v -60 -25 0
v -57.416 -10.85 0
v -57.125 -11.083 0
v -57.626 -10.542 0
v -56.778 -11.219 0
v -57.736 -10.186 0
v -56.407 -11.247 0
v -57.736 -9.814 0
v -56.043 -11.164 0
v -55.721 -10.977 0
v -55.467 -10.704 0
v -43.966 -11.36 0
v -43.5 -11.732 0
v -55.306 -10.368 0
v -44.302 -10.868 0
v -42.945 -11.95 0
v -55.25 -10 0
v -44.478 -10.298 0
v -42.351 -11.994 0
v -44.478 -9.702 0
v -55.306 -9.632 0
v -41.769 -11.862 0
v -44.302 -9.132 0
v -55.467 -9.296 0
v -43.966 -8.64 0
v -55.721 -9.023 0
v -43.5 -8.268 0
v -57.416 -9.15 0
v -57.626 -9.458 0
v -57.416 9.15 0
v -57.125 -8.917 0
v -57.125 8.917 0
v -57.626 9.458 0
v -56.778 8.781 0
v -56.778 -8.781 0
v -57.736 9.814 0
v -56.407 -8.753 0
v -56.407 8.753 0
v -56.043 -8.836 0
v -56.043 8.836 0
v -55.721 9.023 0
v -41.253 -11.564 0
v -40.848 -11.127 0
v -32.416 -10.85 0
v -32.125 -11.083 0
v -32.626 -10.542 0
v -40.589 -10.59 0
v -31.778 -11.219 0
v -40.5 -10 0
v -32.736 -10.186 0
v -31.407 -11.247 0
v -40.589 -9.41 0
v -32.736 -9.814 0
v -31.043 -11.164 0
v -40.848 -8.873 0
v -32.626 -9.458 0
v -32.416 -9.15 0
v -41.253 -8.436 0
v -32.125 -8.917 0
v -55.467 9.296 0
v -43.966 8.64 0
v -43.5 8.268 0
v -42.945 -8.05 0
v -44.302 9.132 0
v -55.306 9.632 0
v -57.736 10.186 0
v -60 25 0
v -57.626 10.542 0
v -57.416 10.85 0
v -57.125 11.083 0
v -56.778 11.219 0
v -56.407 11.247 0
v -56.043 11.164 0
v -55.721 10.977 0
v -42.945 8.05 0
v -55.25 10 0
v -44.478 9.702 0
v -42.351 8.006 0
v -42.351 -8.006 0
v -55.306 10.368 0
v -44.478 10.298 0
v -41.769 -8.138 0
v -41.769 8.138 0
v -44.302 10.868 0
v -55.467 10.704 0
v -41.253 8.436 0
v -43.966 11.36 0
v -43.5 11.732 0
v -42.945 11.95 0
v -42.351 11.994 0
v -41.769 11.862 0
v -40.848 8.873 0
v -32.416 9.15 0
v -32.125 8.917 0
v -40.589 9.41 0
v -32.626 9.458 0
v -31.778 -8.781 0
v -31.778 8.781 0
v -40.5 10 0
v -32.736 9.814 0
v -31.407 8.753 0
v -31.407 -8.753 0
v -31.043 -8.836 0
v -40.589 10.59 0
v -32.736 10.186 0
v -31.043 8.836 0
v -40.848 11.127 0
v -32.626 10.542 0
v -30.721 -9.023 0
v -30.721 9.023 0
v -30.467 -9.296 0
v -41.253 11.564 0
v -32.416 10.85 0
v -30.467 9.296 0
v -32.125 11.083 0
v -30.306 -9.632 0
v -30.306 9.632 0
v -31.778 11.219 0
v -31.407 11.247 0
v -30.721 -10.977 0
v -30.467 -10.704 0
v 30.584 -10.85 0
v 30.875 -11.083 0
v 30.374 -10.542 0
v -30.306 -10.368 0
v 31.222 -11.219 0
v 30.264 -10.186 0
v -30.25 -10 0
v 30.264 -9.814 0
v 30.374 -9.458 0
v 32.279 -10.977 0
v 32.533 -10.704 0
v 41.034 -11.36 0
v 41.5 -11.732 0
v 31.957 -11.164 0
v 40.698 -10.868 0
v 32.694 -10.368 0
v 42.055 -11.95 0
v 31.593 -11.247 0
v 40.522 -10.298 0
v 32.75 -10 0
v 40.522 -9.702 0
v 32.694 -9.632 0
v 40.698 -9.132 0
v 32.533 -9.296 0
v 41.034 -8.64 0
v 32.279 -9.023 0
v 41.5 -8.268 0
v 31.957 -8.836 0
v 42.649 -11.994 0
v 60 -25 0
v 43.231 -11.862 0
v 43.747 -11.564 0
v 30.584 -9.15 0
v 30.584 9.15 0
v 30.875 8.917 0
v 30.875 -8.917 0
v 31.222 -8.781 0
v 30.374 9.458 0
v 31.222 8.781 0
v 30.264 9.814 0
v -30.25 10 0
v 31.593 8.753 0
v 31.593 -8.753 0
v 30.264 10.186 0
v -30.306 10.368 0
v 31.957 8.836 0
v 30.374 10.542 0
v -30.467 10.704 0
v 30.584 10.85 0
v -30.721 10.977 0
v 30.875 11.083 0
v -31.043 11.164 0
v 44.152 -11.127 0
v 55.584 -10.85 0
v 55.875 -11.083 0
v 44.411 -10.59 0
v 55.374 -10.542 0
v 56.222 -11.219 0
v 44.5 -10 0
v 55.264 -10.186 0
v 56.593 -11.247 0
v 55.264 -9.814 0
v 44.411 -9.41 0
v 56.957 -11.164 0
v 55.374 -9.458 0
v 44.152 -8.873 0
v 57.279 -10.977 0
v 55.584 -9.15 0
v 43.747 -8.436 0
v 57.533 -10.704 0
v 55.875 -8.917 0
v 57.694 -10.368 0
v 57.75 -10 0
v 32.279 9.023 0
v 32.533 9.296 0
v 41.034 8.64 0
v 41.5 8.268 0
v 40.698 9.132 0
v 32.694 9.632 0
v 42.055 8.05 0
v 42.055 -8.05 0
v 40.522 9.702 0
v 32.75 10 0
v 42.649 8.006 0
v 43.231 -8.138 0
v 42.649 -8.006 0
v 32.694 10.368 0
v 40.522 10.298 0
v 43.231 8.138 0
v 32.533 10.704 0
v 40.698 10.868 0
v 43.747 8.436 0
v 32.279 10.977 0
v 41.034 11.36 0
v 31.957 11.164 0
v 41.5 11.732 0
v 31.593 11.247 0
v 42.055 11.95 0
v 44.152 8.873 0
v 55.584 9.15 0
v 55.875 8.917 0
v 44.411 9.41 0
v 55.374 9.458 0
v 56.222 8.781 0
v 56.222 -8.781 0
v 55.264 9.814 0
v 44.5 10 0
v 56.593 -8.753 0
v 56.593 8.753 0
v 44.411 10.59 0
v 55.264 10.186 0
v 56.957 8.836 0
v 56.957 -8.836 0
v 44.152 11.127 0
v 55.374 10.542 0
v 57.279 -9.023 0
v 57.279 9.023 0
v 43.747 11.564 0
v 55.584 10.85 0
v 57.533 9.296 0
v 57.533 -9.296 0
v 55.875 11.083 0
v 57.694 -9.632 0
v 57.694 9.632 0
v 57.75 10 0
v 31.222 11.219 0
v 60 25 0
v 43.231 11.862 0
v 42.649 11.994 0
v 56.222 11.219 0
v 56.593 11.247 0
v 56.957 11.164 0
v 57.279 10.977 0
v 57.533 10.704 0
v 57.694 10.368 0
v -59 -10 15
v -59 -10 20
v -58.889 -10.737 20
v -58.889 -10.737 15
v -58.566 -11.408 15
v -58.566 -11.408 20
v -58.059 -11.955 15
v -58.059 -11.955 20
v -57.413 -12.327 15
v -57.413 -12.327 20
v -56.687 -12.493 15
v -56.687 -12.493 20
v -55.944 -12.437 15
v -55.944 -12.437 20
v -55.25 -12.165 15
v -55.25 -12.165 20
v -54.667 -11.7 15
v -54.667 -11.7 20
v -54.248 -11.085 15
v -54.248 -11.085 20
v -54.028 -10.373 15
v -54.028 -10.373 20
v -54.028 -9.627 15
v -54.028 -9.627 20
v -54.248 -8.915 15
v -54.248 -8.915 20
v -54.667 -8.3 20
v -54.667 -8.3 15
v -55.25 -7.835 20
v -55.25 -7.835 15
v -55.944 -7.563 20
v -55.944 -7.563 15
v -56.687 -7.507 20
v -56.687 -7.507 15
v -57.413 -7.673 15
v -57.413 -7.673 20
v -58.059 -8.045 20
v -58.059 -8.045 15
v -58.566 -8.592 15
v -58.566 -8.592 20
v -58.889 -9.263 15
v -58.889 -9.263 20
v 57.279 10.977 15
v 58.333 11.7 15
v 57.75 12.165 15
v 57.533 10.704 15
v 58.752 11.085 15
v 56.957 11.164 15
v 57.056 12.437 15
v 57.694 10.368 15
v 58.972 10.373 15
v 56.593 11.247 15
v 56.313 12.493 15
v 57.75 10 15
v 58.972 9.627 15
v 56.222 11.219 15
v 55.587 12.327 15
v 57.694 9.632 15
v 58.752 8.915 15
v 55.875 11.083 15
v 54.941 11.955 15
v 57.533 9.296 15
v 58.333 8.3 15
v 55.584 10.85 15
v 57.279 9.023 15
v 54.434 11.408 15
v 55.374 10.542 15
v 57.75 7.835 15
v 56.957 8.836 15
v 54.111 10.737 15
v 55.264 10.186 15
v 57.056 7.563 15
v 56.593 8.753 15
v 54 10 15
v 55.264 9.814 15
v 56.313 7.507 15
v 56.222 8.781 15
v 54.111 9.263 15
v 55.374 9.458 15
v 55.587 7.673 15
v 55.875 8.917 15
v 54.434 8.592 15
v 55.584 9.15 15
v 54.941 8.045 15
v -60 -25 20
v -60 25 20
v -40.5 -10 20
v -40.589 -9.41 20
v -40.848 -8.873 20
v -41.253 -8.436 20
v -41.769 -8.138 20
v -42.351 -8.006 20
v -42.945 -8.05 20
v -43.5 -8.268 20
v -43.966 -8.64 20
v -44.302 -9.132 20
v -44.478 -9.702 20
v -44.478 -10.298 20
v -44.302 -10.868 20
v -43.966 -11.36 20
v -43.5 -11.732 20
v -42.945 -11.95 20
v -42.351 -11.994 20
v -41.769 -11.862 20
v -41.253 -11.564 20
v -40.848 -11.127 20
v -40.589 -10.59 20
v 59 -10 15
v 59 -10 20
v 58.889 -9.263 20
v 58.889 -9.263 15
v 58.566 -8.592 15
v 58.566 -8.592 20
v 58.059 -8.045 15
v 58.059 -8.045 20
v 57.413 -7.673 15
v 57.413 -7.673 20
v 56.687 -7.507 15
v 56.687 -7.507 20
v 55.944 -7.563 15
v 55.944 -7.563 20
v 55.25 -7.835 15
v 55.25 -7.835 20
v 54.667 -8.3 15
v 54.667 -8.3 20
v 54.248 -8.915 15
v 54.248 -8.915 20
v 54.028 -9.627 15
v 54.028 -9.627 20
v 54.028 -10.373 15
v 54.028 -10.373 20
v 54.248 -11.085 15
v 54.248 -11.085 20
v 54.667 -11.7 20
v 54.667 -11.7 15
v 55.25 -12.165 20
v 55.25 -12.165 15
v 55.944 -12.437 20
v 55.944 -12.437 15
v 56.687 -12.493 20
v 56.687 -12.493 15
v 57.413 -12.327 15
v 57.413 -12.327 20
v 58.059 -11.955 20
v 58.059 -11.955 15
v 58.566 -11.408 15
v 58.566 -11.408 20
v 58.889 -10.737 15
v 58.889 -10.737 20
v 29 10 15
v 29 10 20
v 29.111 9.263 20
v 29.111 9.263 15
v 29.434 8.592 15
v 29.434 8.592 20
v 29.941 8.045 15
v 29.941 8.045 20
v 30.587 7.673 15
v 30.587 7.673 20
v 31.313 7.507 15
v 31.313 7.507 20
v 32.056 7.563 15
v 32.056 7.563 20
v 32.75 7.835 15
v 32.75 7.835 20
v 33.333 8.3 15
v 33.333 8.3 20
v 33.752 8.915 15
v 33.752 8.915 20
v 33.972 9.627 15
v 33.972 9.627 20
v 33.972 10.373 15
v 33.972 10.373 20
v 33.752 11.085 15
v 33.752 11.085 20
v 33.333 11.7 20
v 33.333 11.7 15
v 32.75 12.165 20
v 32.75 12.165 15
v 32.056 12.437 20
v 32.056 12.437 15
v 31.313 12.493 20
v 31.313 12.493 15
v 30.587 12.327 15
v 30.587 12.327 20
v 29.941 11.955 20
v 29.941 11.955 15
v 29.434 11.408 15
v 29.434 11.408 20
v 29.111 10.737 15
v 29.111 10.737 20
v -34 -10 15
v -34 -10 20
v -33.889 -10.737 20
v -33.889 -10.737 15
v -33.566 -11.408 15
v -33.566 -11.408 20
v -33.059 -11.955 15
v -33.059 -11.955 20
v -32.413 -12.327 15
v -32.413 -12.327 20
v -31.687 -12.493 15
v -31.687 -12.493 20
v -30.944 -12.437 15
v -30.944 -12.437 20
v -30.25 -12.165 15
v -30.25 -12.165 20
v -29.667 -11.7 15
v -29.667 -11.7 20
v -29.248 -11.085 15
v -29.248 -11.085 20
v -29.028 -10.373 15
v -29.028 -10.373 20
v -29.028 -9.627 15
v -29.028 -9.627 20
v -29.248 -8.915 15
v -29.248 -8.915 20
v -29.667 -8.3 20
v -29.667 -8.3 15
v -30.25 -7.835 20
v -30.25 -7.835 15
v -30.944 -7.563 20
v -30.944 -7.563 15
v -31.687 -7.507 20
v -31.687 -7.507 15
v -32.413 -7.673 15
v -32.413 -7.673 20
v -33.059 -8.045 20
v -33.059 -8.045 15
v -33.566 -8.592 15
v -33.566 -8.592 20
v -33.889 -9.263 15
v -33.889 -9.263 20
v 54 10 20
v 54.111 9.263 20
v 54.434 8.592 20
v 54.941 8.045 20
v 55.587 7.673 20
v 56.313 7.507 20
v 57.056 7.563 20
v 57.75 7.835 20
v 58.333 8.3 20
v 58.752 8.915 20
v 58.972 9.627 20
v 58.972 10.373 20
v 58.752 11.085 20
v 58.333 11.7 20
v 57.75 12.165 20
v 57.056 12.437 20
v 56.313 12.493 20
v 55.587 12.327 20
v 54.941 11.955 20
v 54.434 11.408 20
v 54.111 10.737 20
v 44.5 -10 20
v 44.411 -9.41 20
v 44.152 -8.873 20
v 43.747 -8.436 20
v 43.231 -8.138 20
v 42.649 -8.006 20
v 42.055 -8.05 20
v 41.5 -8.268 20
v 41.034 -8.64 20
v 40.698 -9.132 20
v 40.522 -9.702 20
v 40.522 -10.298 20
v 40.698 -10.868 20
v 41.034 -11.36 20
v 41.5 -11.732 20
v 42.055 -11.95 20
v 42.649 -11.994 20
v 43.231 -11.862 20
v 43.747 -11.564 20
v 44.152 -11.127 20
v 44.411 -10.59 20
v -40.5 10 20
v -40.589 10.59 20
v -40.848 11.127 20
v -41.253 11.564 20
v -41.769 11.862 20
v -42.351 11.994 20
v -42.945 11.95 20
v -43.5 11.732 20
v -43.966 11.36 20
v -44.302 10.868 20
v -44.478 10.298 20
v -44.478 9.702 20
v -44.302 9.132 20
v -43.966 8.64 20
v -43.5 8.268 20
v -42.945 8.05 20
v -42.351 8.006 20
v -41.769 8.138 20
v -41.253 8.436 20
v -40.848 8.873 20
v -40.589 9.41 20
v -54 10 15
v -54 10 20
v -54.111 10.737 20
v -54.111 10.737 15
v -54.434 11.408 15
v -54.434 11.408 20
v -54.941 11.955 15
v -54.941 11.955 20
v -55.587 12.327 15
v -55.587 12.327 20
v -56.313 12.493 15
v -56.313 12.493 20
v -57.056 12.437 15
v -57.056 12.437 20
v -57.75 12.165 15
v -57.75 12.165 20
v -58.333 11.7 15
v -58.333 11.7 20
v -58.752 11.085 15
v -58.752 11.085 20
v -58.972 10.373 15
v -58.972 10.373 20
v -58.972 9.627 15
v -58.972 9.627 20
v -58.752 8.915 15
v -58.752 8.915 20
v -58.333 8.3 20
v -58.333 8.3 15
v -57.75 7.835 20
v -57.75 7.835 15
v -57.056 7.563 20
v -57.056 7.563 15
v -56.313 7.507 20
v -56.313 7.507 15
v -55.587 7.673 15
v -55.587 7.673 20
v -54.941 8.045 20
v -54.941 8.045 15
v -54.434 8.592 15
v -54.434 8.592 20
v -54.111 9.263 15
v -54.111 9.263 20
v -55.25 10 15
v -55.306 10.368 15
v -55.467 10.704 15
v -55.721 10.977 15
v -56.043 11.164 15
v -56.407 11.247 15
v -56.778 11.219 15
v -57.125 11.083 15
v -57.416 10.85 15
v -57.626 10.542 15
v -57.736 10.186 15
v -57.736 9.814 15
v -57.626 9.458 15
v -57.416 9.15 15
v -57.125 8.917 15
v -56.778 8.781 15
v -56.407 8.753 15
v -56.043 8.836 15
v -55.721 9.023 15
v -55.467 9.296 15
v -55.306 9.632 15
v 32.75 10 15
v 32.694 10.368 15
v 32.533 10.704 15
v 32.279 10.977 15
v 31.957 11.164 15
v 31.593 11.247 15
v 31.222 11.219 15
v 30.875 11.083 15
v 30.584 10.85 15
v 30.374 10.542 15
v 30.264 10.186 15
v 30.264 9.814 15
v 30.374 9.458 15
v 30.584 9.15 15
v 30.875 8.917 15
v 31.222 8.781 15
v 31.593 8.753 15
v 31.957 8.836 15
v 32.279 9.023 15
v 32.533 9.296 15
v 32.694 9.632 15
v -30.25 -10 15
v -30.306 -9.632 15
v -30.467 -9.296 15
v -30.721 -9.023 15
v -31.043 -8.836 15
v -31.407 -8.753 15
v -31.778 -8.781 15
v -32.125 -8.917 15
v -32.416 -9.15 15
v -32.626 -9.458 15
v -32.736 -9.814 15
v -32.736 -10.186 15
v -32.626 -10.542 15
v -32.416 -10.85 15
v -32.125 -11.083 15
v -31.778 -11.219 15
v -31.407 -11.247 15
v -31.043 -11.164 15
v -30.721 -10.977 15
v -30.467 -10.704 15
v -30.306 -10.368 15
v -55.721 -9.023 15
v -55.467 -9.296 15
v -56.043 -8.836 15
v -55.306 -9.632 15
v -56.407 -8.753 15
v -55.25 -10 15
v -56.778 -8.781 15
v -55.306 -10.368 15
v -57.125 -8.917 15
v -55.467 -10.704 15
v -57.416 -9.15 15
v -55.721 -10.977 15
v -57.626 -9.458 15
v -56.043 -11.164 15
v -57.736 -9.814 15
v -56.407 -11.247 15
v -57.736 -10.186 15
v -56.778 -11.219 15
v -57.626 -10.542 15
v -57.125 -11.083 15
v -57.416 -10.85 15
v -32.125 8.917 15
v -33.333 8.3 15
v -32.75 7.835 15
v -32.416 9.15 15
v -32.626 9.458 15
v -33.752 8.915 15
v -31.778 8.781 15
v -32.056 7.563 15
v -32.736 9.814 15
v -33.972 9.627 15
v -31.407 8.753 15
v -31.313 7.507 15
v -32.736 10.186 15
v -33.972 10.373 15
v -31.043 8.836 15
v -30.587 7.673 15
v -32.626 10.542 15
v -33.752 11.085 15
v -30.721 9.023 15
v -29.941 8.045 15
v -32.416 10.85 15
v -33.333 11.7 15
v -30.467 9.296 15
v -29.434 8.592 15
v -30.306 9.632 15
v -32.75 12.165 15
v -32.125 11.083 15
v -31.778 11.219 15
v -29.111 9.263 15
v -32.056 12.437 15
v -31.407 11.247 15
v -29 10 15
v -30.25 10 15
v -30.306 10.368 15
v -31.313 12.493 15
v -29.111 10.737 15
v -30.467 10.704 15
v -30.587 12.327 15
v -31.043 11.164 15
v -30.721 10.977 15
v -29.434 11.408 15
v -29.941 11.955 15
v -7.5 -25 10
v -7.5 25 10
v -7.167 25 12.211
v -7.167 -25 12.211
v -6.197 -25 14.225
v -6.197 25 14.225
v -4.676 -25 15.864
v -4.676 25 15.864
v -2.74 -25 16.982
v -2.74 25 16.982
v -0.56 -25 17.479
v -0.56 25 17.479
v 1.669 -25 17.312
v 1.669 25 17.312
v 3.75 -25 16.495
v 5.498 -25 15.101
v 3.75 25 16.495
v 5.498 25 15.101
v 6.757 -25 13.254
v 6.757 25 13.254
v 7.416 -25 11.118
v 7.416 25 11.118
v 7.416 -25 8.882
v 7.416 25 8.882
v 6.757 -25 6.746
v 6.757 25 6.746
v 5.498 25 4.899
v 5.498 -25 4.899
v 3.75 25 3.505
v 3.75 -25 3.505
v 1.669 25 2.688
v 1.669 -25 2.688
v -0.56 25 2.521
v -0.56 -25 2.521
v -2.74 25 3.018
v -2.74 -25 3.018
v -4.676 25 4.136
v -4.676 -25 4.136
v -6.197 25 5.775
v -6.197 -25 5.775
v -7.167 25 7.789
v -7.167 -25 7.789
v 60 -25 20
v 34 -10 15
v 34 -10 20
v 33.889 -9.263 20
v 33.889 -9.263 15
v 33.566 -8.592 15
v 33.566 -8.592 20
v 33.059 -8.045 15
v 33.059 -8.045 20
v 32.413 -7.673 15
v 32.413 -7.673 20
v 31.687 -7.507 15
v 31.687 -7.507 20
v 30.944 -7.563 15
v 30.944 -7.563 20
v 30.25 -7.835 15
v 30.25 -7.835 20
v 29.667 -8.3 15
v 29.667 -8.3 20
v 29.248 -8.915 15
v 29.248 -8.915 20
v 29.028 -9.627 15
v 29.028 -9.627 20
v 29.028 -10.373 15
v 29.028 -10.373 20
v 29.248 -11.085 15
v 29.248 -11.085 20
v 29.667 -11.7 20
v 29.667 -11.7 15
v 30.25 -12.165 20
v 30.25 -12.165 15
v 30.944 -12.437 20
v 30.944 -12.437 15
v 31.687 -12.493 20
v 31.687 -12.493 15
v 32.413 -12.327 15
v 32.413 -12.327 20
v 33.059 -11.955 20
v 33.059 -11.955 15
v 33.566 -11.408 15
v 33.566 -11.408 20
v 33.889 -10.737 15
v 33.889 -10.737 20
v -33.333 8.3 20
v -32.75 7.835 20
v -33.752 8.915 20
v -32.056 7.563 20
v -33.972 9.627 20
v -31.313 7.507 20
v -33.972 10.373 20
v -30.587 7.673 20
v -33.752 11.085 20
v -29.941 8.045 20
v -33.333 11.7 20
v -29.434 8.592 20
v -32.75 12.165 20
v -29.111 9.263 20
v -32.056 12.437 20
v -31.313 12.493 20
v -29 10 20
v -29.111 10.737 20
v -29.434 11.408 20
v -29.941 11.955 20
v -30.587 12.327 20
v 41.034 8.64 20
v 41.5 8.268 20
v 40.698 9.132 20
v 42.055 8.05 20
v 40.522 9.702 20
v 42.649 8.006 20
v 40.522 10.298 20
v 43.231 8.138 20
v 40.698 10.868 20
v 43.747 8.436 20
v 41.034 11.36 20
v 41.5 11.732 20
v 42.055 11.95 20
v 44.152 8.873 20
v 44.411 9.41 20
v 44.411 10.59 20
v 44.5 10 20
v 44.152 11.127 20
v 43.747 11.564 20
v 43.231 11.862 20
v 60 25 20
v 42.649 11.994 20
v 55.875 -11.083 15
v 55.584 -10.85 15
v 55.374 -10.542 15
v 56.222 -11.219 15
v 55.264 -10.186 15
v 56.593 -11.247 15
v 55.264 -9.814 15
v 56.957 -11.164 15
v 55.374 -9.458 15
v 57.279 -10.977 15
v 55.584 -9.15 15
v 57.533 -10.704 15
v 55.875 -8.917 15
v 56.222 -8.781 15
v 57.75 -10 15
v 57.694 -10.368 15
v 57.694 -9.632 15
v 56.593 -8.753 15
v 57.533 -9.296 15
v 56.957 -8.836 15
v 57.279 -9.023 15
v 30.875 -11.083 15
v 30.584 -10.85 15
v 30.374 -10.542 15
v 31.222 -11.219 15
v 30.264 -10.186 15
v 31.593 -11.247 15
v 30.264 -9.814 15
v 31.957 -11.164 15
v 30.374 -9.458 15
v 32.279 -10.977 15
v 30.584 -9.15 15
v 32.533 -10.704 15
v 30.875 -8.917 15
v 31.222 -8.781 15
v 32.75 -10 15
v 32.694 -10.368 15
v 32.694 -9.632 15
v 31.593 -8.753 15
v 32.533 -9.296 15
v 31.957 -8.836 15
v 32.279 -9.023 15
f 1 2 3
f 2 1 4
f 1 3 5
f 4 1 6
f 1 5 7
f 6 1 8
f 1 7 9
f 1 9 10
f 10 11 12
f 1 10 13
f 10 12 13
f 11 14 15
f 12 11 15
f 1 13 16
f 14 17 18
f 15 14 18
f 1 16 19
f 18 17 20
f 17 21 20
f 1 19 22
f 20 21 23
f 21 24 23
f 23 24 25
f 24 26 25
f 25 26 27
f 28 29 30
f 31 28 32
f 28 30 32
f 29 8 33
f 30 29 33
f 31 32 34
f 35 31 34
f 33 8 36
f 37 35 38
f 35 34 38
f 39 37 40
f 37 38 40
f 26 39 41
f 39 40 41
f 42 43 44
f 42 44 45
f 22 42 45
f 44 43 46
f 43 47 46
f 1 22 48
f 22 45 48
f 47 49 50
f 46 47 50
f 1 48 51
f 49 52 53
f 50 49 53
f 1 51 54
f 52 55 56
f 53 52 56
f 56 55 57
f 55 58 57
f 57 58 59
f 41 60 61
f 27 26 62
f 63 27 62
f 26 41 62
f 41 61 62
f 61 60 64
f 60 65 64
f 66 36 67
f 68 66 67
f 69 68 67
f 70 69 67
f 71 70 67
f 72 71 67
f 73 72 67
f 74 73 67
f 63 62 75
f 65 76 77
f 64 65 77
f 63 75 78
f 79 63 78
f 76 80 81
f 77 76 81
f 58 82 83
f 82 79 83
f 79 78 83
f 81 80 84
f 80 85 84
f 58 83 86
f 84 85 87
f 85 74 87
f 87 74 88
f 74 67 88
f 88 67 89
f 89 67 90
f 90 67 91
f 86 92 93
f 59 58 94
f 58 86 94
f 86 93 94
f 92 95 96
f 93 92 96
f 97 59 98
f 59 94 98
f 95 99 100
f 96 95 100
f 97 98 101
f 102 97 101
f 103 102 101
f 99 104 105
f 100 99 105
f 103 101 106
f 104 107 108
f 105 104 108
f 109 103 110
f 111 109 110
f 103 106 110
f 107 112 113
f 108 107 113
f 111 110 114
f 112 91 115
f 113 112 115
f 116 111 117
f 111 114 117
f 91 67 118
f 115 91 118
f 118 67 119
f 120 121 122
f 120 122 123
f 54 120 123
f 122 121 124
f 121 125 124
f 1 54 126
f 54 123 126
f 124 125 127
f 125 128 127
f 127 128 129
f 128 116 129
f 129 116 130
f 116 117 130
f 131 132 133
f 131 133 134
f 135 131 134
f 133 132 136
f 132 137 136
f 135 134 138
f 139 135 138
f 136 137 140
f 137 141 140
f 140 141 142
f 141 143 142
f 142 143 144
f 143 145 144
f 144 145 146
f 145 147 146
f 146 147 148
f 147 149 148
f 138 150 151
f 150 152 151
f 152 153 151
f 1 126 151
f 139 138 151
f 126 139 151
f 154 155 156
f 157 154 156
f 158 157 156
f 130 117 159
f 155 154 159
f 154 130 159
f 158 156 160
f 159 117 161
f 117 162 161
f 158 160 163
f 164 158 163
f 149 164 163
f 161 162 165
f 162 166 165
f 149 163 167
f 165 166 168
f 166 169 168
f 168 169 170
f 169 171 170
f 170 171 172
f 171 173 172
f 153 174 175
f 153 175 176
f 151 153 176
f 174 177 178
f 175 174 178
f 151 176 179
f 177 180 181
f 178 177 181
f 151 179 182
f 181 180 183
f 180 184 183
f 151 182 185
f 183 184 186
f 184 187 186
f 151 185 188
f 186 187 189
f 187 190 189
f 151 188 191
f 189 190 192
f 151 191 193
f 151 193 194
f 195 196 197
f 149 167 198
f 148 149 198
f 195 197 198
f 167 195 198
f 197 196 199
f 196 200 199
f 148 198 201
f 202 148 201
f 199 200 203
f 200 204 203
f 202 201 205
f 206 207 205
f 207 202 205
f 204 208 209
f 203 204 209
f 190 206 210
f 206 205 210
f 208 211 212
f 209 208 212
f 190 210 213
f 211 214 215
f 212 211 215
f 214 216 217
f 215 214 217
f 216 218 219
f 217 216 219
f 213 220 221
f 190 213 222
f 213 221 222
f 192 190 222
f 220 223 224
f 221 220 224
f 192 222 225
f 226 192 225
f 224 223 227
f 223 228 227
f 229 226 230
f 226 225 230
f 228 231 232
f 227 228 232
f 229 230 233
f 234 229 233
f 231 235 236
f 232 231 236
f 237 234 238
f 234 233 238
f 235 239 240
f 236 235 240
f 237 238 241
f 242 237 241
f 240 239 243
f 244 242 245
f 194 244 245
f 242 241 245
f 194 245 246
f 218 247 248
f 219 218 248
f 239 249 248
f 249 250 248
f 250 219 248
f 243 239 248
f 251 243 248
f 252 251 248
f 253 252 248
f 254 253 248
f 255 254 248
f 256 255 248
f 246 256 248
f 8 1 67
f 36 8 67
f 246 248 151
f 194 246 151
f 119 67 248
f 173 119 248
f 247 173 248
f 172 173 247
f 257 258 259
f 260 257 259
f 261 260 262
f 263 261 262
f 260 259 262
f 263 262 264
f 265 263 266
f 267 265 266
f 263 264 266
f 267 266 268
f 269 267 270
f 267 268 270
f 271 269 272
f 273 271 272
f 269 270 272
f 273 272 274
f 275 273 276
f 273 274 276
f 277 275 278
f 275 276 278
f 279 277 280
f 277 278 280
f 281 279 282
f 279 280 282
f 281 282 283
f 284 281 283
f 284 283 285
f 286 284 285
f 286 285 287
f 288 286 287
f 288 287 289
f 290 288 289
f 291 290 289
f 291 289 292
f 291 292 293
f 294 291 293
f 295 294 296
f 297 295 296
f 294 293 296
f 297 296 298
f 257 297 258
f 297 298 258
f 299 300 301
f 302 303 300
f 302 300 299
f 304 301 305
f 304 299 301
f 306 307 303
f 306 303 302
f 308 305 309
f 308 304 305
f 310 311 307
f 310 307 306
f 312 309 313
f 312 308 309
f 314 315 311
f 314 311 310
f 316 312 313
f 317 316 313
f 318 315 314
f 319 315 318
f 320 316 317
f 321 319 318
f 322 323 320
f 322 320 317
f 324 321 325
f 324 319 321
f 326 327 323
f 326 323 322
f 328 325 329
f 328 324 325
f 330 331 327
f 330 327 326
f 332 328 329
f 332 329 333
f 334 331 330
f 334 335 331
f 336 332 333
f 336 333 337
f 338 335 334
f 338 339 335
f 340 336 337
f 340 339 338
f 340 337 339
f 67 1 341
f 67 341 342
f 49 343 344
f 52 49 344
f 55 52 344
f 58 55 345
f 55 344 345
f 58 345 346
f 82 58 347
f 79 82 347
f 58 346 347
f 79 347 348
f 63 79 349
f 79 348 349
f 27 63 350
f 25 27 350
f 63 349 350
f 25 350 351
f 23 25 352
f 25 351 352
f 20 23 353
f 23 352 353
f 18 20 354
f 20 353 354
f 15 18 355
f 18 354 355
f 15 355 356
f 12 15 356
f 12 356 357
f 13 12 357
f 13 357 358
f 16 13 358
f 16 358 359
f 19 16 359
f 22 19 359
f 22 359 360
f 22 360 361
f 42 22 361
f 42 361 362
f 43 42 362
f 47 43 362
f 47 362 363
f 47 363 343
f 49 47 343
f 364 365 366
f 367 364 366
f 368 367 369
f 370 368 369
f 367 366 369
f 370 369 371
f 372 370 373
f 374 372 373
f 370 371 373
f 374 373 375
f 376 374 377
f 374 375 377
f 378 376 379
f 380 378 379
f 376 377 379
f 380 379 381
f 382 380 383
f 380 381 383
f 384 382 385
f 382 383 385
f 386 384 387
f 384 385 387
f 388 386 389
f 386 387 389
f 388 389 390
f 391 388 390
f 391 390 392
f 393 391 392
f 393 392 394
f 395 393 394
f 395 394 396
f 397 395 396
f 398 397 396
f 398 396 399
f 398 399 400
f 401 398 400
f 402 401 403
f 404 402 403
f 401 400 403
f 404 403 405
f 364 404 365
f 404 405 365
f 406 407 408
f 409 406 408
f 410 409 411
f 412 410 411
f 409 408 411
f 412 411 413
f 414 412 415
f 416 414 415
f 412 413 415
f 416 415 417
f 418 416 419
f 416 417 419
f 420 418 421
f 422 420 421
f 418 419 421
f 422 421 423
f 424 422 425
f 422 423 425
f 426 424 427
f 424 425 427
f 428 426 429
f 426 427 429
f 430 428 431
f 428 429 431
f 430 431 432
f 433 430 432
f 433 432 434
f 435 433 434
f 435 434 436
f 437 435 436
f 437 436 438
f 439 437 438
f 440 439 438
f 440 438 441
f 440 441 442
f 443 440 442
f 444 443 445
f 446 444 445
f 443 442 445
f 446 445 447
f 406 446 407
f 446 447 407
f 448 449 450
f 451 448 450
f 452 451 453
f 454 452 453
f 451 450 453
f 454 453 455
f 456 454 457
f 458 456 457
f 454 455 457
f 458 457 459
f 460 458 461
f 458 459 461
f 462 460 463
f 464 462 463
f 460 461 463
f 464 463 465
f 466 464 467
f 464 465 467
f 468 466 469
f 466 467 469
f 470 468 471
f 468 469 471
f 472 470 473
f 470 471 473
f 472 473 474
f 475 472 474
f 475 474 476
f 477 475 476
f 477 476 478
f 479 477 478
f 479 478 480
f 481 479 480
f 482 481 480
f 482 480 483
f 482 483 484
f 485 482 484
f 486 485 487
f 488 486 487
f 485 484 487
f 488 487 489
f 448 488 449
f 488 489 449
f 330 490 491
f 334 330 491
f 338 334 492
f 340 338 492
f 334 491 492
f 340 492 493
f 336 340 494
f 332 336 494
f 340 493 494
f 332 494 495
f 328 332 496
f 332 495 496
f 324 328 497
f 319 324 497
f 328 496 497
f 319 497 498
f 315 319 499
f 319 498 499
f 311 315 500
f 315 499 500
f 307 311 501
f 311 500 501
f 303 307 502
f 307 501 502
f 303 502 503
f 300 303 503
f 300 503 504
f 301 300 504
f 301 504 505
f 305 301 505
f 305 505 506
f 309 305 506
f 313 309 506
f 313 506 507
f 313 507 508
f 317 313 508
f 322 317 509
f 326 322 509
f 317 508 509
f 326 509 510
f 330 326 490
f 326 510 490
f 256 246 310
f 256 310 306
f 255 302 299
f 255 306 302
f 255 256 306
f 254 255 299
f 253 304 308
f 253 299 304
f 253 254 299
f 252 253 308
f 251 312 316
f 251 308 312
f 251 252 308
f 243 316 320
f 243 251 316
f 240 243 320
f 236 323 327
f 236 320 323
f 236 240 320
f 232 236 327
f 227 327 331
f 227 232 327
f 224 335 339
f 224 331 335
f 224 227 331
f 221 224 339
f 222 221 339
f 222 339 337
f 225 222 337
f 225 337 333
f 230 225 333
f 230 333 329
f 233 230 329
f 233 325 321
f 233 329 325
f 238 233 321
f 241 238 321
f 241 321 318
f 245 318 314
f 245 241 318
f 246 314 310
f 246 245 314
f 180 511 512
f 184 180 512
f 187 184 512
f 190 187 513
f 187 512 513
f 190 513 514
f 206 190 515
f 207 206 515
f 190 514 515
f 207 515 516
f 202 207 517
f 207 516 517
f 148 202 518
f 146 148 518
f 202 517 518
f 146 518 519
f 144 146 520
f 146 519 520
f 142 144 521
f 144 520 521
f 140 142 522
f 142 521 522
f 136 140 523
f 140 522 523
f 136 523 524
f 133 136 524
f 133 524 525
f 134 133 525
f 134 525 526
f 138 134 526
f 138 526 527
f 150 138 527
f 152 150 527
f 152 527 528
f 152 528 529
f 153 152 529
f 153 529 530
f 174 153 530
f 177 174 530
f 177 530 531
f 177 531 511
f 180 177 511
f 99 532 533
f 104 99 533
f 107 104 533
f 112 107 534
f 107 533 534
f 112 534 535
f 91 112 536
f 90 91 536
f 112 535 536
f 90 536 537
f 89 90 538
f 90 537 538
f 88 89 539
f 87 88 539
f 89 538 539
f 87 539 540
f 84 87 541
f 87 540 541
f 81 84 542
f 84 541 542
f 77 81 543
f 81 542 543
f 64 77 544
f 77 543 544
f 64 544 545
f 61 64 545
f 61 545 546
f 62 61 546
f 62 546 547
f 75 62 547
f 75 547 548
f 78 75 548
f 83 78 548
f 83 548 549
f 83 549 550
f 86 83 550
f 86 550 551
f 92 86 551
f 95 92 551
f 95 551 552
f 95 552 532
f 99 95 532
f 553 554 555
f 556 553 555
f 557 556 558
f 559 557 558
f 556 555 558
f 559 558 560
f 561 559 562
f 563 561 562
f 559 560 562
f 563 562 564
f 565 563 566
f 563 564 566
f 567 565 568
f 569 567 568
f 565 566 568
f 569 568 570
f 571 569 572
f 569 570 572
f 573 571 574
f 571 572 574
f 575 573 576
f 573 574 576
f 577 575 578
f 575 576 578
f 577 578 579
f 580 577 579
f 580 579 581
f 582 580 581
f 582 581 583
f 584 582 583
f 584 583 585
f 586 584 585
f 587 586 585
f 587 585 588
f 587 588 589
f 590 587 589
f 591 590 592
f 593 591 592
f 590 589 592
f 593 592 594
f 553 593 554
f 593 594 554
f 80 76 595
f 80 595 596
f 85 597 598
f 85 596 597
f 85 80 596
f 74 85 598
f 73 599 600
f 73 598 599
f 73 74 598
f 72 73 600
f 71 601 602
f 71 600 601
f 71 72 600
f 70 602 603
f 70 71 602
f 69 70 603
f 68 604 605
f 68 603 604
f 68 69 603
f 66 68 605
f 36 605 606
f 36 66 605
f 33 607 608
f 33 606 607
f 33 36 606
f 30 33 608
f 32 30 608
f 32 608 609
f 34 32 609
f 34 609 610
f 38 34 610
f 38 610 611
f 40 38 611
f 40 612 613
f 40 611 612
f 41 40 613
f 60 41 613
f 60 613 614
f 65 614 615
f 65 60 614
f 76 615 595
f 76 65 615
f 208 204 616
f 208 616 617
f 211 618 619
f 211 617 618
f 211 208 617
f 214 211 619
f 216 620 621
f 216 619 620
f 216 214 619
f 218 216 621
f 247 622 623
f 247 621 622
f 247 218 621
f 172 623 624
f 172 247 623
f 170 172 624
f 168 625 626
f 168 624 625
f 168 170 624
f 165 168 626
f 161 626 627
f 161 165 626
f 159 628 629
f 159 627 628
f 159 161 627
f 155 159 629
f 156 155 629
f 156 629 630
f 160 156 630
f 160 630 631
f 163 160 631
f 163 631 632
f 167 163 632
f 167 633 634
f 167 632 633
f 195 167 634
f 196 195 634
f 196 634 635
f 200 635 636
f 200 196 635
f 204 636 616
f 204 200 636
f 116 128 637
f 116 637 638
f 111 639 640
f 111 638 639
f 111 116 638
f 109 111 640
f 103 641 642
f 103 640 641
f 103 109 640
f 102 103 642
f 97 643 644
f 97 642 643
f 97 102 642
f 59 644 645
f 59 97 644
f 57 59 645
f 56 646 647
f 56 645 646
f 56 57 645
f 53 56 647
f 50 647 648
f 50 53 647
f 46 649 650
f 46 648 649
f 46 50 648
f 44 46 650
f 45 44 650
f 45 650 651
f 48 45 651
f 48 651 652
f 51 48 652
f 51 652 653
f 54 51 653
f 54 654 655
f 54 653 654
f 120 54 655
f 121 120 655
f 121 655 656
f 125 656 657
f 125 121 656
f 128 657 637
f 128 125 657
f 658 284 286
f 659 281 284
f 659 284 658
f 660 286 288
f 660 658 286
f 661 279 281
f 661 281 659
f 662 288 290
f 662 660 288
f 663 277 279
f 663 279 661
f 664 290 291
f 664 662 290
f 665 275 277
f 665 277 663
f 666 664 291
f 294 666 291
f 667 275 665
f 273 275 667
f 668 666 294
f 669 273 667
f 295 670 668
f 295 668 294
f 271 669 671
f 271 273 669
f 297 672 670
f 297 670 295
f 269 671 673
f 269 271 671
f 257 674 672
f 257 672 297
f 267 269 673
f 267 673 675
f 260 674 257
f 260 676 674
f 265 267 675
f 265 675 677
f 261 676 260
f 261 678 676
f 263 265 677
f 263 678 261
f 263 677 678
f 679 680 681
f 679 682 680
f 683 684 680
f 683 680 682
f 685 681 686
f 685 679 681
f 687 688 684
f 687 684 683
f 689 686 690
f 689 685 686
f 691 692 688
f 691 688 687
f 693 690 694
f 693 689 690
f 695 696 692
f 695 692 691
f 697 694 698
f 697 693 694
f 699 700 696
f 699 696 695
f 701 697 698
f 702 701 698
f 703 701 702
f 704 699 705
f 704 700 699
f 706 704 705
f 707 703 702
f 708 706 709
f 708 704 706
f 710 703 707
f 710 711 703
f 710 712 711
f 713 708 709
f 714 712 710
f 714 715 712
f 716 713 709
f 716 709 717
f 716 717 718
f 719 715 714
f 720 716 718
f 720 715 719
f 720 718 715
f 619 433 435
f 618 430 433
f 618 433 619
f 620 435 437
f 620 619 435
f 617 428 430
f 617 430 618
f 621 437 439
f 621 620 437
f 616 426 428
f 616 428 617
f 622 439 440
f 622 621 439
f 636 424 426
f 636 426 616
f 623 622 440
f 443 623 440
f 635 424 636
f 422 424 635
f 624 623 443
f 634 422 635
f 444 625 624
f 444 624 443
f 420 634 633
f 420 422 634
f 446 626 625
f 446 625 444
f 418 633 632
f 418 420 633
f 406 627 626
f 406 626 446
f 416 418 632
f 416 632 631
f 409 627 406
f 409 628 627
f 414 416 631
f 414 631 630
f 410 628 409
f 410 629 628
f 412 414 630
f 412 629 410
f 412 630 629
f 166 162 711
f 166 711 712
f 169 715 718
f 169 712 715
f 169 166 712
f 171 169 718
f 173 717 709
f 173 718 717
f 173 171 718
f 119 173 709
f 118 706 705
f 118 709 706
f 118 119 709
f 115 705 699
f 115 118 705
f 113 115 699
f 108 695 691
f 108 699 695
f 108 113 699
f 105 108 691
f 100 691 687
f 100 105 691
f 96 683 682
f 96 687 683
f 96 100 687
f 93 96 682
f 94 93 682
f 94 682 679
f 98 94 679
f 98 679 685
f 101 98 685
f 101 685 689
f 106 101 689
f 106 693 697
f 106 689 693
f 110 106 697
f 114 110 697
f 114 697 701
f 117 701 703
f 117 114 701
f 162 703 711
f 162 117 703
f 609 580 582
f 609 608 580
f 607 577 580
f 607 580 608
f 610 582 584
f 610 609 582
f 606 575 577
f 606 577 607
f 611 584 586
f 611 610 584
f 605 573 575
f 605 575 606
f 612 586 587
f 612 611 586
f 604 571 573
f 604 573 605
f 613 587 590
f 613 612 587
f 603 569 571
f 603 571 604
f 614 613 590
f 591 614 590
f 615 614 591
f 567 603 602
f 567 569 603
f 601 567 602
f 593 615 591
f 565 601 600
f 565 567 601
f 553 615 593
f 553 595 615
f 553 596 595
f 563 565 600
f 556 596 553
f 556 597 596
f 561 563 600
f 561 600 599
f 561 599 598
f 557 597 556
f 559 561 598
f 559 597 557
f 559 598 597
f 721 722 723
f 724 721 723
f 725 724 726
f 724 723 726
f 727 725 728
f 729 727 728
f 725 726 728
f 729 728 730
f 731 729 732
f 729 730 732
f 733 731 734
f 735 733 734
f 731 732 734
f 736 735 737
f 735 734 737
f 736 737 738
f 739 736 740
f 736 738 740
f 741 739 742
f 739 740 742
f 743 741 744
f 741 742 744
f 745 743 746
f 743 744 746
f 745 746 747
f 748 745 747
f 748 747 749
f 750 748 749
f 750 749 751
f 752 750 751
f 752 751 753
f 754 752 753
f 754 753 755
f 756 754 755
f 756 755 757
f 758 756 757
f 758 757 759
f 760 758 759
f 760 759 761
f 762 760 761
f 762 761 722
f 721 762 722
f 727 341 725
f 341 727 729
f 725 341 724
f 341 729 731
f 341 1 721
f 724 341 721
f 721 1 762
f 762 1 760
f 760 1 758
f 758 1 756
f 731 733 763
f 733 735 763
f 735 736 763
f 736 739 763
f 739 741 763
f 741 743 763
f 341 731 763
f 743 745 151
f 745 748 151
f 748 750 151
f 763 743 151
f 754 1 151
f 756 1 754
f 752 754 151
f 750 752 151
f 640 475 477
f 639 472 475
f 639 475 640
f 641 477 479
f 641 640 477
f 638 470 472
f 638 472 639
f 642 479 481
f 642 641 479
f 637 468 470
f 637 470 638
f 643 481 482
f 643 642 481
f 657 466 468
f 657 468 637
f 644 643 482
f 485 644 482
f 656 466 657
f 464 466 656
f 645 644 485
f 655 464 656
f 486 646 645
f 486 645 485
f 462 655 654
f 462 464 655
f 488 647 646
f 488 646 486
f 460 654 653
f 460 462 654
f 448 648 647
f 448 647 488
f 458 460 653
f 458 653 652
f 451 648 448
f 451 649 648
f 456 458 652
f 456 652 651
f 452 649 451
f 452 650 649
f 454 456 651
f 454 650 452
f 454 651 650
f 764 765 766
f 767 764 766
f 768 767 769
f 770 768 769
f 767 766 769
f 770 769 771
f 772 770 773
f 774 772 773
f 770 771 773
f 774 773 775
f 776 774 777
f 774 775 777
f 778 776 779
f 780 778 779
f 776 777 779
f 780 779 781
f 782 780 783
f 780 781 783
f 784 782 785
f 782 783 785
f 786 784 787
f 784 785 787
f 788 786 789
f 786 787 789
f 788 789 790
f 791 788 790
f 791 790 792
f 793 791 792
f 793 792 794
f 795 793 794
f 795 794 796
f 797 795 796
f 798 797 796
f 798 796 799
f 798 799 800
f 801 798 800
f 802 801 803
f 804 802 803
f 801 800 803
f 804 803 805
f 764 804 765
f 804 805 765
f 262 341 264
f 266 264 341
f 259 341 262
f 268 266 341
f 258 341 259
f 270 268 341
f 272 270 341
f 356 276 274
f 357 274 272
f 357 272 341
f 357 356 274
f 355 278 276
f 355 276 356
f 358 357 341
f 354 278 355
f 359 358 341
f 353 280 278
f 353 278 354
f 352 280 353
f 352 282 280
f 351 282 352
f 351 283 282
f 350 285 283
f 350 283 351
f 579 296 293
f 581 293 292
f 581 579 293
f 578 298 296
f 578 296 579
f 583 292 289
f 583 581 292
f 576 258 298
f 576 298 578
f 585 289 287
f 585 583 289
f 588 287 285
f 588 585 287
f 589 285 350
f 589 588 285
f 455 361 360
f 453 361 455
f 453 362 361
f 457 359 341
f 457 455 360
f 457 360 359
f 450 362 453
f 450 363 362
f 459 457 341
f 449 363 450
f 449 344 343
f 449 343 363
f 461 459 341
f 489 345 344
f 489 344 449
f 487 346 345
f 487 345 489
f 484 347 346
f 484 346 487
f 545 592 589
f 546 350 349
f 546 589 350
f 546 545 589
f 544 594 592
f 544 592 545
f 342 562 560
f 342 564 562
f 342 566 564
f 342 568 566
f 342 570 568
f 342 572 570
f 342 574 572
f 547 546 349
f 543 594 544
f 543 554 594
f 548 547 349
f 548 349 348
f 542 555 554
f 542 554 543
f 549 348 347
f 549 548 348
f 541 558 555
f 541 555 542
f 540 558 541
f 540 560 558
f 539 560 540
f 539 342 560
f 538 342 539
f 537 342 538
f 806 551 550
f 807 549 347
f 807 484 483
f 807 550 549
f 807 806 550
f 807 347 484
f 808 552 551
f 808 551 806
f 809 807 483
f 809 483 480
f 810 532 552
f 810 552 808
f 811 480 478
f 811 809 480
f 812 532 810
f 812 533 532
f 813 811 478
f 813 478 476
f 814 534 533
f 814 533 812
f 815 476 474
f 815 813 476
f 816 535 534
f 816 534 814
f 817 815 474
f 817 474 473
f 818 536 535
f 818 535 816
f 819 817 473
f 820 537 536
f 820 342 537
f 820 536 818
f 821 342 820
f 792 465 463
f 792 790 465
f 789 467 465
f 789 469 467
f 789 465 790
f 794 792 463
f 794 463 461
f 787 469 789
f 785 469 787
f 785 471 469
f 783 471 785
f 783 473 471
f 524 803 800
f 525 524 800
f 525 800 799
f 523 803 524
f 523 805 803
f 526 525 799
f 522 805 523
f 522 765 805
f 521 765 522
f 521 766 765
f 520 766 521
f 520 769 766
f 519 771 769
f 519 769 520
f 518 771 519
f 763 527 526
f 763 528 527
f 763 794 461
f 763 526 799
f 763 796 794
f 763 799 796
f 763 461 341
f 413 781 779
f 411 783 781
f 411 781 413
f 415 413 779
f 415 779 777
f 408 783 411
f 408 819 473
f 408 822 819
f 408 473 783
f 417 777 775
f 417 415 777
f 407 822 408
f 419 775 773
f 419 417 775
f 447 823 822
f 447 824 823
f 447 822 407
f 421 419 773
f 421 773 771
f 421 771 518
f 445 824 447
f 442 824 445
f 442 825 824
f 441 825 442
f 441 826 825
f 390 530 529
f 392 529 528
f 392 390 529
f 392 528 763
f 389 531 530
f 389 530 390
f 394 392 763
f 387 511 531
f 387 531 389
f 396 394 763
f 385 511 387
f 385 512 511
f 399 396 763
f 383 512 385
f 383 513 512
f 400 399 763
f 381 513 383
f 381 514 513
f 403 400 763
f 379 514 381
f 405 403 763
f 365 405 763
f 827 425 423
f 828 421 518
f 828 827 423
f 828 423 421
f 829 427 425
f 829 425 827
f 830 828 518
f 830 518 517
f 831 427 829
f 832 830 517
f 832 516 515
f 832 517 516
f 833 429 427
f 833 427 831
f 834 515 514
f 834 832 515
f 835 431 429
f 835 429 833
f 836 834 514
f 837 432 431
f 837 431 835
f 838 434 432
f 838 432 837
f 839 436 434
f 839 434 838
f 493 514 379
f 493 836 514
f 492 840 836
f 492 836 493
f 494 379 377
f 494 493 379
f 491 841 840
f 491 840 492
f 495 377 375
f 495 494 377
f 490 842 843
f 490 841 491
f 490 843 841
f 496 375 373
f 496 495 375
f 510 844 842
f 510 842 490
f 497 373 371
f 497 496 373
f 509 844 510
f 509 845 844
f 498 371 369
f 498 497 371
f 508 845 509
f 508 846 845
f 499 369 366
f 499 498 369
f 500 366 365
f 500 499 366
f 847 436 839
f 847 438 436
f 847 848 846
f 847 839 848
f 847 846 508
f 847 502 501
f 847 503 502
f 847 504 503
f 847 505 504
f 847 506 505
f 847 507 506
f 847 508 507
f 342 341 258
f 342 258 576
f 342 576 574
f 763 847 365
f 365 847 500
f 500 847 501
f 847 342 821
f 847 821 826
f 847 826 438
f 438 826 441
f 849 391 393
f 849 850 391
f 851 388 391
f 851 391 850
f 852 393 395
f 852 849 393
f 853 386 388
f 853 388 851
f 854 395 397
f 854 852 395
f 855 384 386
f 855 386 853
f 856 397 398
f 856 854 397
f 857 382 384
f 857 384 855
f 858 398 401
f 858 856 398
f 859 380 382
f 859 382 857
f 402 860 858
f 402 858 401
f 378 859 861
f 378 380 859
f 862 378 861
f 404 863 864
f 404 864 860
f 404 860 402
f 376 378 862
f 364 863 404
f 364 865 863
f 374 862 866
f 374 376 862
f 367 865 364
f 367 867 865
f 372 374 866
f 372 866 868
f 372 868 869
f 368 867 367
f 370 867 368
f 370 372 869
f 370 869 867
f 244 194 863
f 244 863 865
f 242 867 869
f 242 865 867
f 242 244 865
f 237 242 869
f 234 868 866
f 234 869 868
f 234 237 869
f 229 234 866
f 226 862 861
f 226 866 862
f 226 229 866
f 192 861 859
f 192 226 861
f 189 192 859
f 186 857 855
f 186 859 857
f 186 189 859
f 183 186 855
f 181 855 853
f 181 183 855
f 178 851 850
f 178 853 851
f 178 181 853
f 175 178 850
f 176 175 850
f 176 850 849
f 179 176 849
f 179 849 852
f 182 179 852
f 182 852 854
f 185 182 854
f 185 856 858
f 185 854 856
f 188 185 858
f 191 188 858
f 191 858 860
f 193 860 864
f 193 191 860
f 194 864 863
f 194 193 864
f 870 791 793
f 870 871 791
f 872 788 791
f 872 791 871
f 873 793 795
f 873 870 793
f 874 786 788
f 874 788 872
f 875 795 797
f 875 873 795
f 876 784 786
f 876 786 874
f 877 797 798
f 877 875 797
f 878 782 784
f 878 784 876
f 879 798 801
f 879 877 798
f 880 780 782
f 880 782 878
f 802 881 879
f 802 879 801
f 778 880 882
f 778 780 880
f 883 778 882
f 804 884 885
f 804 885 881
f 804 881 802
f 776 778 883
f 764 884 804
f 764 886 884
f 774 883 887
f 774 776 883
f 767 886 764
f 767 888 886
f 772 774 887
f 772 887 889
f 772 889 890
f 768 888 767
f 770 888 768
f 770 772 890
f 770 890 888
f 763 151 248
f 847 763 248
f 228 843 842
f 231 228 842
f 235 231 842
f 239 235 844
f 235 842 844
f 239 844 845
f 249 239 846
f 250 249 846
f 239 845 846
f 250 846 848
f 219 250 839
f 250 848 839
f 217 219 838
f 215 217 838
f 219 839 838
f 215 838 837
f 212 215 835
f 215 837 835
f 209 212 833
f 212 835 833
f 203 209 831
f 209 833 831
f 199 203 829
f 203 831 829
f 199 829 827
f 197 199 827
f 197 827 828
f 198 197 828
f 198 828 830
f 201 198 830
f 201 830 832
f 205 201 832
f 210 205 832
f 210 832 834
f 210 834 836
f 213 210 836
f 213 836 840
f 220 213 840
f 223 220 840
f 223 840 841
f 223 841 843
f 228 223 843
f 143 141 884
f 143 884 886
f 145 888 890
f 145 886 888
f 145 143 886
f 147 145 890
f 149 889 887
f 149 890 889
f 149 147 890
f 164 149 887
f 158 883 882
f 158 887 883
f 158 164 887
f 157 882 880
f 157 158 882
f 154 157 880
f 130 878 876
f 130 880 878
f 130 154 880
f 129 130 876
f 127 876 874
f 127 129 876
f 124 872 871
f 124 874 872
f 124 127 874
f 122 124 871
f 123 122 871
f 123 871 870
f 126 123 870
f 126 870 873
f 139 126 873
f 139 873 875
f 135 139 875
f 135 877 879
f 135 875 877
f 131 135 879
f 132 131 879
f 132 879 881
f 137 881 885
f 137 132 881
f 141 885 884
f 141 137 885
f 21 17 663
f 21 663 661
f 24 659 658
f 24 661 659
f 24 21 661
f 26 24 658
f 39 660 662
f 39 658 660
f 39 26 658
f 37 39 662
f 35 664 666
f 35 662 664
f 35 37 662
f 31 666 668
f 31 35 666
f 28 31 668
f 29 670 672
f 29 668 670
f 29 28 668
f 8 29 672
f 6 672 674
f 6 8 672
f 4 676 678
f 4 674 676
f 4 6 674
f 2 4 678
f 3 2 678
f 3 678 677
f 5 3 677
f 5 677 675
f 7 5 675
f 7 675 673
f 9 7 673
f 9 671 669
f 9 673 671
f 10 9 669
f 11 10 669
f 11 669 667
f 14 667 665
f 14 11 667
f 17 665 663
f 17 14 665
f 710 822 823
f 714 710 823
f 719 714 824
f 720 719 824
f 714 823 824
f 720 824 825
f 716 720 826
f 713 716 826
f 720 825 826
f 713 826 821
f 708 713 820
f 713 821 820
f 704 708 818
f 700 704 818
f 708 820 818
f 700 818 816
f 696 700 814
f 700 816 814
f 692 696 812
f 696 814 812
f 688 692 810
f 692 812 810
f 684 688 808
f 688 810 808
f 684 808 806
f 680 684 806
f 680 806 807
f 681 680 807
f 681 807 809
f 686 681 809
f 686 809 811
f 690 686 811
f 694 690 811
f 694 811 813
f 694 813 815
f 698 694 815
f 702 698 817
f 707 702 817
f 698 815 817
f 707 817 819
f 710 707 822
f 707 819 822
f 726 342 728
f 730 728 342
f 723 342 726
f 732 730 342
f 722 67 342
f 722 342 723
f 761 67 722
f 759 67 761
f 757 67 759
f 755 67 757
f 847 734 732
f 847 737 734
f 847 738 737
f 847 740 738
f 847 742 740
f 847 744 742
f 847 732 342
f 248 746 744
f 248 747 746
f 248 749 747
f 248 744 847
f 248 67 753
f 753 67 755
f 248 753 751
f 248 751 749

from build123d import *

# Parameters (mm, degrees)
SKETCH1_W               = 120
SKETCH1_H               = 50
BOSS_EXTRUDE1_DEPTH     = 20
CUT_EXTRUDE1_DEPTH      = 69.007352544
CUT_EXTRUDE1_DEPTH_BACK = 69.007352544
SKETCH2_R               = 1.25
SKETCH3_R               = 2.5
CUT_EXTRUDE2_DEPTH      = 5
CUT_EXTRUDE3_REACH      = 82.623
SKETCH4_R               = 7.5
CUT_EXTRUDE4_REACH      = 70.007
SKETCH5_R               = 2


with BuildPart() as part:
    # Sketch1 → Boss-Extrude1 (new body)
    with BuildSketch(Plane.XY):
        Rectangle(SKETCH1_W, SKETCH1_H)
    extrude(amount=BOSS_EXTRUDE1_DEPTH)

    # Sketch2 → Cut-Extrude1 (cut, two sides: drawn at the far end of the back side and taken through both)
    with BuildSketch(Plane.XY.offset(20).offset(-CUT_EXTRUDE1_DEPTH_BACK)):
        with Locations((-56.5, 10)):
            Circle(SKETCH2_R)
        with Locations((-31.5, 10)):
            Circle(SKETCH2_R)
        with Locations((-56.5, -10)):
            Circle(SKETCH2_R)
        with Locations((-31.5, -10)):
            Circle(SKETCH2_R)
        with Locations((56.5, -10)):
            Circle(SKETCH2_R)
        with Locations((31.5, -10)):
            Circle(SKETCH2_R)
        with Locations((31.5, 10)):
            Circle(SKETCH2_R)
        with Locations((56.5, 10)):
            Circle(SKETCH2_R)
    extrude(amount=CUT_EXTRUDE1_DEPTH + CUT_EXTRUDE1_DEPTH_BACK, mode=Mode.SUBTRACT)

    # Sketch3 → Cut-Extrude2 (cut)
    with BuildSketch(Plane.XY.offset(20)):
        with Locations((-56.5, 10)):
            Circle(SKETCH3_R)
        with Locations((-31.5, 10)):
            Circle(SKETCH3_R)
        with Locations(Location((-56.5, -10, 0), (0, 0, 180))):
            Circle(SKETCH3_R)
        with Locations(Location((-31.5, -10, 0), (0, 0, 180))):
            Circle(SKETCH3_R)
        with Locations(Location((56.5, 10, 0), (0, 0, 180))):
            Circle(SKETCH3_R)
        with Locations(Location((31.5, 10, 0), (0, 0, 180))):
            Circle(SKETCH3_R)
        with Locations((31.5, -10)):
            Circle(SKETCH3_R)
        with Locations((56.5, -10)):
            Circle(SKETCH3_R)
    extrude(amount=-CUT_EXTRUDE2_DEPTH, mode=Mode.SUBTRACT)

    # Sketch4 → Cut-Extrude3 (cut, up to next)
    with BuildSketch(Plane(origin=(0, 25, 0), x_dir=(1, 0, 0), z_dir=(0, 1, 0)), mode=Mode.PRIVATE) as cut_extrude3_sk1:
        with Locations(Location((0, -10, 0), (0, 0, 180))):
            Circle(SKETCH4_R)
    cut_extrude3_tool1 = extrude(cut_extrude3_sk1.sketch, amount=-CUT_EXTRUDE3_REACH, mode=Mode.PRIVATE) & part.part
    add(cut_extrude3_tool1.solids().sort_by_distance((0, 25, 10))[0], mode=Mode.SUBTRACT)

    # Sketch5 → Cut-Extrude4 (cut, up to next)
    with BuildSketch(Plane.XY.offset(20), mode=Mode.PRIVATE) as cut_extrude4_sk1:
        with Locations((42.5, 10)):
            Circle(SKETCH5_R)
    cut_extrude4_tool1 = extrude(cut_extrude4_sk1.sketch, amount=-CUT_EXTRUDE4_REACH, mode=Mode.PRIVATE) & part.part
    # Sketch5 → Cut-Extrude4 (cut, up to next)
    with BuildSketch(Plane.XY.offset(20), mode=Mode.PRIVATE) as cut_extrude4_sk2:
        with Locations((42.5, -10)):
            Circle(SKETCH5_R)
    cut_extrude4_tool2 = extrude(cut_extrude4_sk2.sketch, amount=-CUT_EXTRUDE4_REACH, mode=Mode.PRIVATE) & part.part
    # Sketch5 → Cut-Extrude4 (cut, up to next)
    with BuildSketch(Plane.XY.offset(20), mode=Mode.PRIVATE) as cut_extrude4_sk3:
        with Locations((-42.5, -10)):
            Circle(SKETCH5_R)
    cut_extrude4_tool3 = extrude(cut_extrude4_sk3.sketch, amount=-CUT_EXTRUDE4_REACH, mode=Mode.PRIVATE) & part.part
    # Sketch5 → Cut-Extrude4 (cut, up to next)
    with BuildSketch(Plane.XY.offset(20), mode=Mode.PRIVATE) as cut_extrude4_sk4:
        with Locations((-42.5, 10)):
            Circle(SKETCH5_R)
    cut_extrude4_tool4 = extrude(cut_extrude4_sk4.sketch, amount=-CUT_EXTRUDE4_REACH, mode=Mode.PRIVATE) & part.part
    add(cut_extrude4_tool1.solids().sort_by_distance((42.5, 10, 20))[0], mode=Mode.SUBTRACT)
    add(cut_extrude4_tool2.solids().sort_by_distance((42.5, -10, 20))[0], mode=Mode.SUBTRACT)
    add(cut_extrude4_tool3.solids().sort_by_distance((-42.5, -10, 20))[0], mode=Mode.SUBTRACT)
    add(cut_extrude4_tool4.solids().sort_by_distance((-42.5, 10, 20))[0], mode=Mode.SUBTRACT)


solid = part.part
